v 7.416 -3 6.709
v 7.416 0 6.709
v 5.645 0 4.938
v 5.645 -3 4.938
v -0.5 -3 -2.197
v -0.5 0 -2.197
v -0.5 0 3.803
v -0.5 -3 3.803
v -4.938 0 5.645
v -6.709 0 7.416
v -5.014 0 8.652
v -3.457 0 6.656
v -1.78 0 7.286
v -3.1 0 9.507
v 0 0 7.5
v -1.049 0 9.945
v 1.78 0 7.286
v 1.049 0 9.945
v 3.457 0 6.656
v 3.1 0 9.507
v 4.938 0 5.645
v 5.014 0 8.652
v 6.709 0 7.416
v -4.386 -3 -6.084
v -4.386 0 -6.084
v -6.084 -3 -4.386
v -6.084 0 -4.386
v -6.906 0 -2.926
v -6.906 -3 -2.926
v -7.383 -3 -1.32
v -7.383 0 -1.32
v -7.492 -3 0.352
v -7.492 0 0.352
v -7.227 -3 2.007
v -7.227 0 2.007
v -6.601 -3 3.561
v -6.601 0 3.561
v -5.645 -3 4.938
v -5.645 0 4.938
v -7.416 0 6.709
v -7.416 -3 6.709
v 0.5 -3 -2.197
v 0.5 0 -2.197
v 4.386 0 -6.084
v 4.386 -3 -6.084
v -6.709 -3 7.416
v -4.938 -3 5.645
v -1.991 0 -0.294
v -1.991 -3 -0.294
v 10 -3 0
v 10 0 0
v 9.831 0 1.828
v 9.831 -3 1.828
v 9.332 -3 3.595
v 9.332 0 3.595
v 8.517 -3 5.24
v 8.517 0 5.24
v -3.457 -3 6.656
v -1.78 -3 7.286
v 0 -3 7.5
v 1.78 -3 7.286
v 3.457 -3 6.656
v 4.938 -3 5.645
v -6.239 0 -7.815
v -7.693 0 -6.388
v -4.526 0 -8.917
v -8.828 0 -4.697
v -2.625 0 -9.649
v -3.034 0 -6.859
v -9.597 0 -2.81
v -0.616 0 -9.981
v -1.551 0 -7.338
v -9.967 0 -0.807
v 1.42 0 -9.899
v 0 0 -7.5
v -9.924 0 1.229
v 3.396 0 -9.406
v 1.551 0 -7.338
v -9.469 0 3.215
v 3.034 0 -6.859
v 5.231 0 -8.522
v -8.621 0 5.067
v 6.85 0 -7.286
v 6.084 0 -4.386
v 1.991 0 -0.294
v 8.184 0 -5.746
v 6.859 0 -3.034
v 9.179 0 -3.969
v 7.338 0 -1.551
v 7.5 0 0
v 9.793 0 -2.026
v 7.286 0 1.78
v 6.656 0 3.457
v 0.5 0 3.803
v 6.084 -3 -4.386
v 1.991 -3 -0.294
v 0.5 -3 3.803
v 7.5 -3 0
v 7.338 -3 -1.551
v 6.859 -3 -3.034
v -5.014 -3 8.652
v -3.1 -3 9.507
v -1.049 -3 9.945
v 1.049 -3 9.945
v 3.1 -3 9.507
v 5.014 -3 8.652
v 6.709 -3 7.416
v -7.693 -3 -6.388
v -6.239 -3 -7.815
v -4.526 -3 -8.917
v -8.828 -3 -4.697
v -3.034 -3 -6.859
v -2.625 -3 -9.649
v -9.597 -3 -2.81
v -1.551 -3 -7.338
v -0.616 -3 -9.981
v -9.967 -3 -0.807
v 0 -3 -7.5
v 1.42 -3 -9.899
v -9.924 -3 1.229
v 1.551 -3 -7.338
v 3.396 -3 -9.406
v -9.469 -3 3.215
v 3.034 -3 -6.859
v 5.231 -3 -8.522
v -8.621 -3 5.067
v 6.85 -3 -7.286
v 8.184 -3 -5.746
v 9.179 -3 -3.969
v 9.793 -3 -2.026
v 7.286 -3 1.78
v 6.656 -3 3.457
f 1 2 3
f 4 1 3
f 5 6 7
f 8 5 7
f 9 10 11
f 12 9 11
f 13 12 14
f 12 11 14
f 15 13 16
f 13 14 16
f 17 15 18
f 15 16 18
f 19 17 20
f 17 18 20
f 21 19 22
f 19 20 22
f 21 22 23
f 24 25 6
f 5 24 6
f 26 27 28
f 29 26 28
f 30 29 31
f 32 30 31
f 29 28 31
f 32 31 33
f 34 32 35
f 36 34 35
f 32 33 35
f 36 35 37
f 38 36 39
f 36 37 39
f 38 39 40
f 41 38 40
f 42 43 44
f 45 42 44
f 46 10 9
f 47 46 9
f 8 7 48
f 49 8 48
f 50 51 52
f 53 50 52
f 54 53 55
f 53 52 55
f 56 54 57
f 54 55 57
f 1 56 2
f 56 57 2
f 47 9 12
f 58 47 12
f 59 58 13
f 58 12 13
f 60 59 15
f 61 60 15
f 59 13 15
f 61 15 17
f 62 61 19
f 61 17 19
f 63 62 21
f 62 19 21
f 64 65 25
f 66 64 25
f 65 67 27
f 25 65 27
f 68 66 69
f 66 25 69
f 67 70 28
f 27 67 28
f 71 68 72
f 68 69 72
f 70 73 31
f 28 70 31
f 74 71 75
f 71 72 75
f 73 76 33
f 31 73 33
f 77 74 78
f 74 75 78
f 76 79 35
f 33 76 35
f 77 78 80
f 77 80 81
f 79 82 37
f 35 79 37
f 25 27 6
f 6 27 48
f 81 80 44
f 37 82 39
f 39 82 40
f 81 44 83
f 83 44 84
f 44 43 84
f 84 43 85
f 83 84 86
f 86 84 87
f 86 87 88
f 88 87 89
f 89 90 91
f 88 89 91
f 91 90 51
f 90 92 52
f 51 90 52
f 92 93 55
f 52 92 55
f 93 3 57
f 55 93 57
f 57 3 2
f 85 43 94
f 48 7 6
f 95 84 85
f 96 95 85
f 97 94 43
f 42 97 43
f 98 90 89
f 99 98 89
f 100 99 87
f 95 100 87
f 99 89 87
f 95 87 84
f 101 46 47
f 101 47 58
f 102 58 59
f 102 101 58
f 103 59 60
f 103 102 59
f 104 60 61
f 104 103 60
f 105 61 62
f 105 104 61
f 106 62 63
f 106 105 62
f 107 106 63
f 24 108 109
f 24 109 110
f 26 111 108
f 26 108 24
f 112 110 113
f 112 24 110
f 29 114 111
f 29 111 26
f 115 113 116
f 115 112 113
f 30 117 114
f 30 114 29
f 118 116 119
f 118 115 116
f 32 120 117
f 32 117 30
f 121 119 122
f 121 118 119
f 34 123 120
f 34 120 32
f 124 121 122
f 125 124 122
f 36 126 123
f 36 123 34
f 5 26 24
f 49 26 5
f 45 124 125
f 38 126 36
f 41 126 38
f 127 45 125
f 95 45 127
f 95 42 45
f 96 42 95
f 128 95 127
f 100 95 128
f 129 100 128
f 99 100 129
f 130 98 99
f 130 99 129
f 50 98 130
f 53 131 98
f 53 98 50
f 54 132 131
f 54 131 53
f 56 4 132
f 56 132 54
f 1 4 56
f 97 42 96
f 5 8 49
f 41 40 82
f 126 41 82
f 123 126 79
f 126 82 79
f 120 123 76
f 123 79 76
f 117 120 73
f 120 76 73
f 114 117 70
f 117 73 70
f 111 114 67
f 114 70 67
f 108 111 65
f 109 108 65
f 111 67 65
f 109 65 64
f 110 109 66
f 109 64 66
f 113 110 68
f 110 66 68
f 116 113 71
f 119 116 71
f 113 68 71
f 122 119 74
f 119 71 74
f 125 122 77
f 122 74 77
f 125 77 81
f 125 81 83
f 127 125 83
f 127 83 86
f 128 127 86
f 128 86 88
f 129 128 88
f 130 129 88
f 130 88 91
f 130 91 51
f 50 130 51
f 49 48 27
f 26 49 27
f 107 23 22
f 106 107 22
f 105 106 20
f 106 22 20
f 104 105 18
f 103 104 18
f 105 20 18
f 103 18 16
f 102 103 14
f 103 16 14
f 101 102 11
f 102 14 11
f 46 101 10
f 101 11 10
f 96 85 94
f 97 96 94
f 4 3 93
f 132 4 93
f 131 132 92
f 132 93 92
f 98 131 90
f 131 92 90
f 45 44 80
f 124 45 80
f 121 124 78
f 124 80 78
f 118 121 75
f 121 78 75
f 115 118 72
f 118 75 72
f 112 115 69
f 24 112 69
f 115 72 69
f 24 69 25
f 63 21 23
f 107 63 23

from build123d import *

# Parameters (mm, degrees)
F1_DEPTH = 3
F2_DEPTH = 3
F4_DEPTH = 3


with BuildPart() as f1:
    # F0 (on Front) → F1 (new body)
    with BuildSketch(Plane.XZ):
        with BuildLine():
            ThreePointArc((-7.4157768365, 6.7086700553), (-3.5945953621, -9.331606731), (10, 0))
            ThreePointArc((10, 0), (9.331606731, 3.5945953621), (7.4157768365, 6.7086700553))
            Line((7.4157768365, 6.7086700553), (5.6450560127, 4.9379492315))
            ThreePointArc((5.6450560127, 4.9379492315), (7.0209657489, 2.6374305588), (7.5, 0))
            ThreePointArc((7.5, 0), (-2.6374305588, -7.0209657489), (-5.6450560127, 4.9379492315))
            Line((-5.6450560127, 4.9379492315), (-7.4157768365, 6.7086700553))
        make_face()
    extrude(amount=F1_DEPTH)

    # F3 (on Front) → F4 (join, through all)
    with BuildSketch(Plane.XZ):
        with BuildLine():
            Line((-1.9912281105, -0.2941718356), (-6.0835066474, -4.3864503726))
            ThreePointArc((-6.0835066474, -4.3864503726), (-5.7118298294, -4.8605555238), (-5.3033008589, -5.3033008589))
            Line((-5.3033008589, -5.3033008589), (-0.5, -0.5))
            Line((-0.5, -0.5), (-0.5, 1.1970562748))
            Line((-0.5, 1.1970562748), (-1.9912281105, -0.2941718356))
        make_face()
        with BuildLine():
            Line((-0.5, -0.5), (-5.3033008589, -5.3033008589))
            ThreePointArc((-5.3033008589, -5.3033008589), (-4.8605555238, -5.7118298294), (-4.3864503726, -6.0835066474))
            Line((-4.3864503726, -6.0835066474), (-0.5, -2.1970562748))
            Line((-0.5, -2.1970562748), (-0.5, -0.5))
        make_face()
        Polygon((-0.5, 3.8029437252), (-1.9912281105, -0.2941718356), (-0.5, 1.1970562748), align=None)
        with BuildLine():
            Line((0.5, -0.5), (5.3033008589, -5.3033008589))
            ThreePointArc((5.3033008589, -5.3033008589), (5.7118298294, -4.8605555238), (6.0835066474, -4.3864503726))
            Line((6.0835066474, -4.3864503726), (1.9912281105, -0.2941718356))
            Line((1.9912281105, -0.2941718356), (0.5, 1.1970562748))
            Line((0.5, 1.1970562748), (0.5, -0.5))
        make_face()
        with BuildLine():
            Line((0.5, -2.1970562748), (4.3864503726, -6.0835066474))
            ThreePointArc((4.3864503726, -6.0835066474), (4.8605555238, -5.7118298294), (5.3033008589, -5.3033008589))
            Line((5.3033008589, -5.3033008589), (0.5, -0.5))
            Line((0.5, -0.5), (0.5, -2.1970562748))
        make_face()
        Polygon((0.5, 3.8029437252), (0.5, 1.1970562748), (1.9912281105, -0.2941718356), align=None)
    extrude(amount=F4_DEPTH)


with BuildPart() as f2:
    # F0 (on Front) → F2 (new body, through all)
    with BuildSketch(Plane.XZ):
        with BuildLine():
            Line((4.9379492315, 5.6450560127), (6.7086700553, 7.4157768365))
            ThreePointArc((6.7086700553, 7.4157768365), (0, 10), (-6.7086700553, 7.4157768365))
            Line((-6.7086700553, 7.4157768365), (-4.9379492315, 5.6450560127))
            ThreePointArc((-4.9379492315, 5.6450560127), (0, 7.5), (4.9379492315, 5.6450560127))
        make_face()
    extrude(amount=F2_DEPTH)


solid = Compound([f1.part, f2.part])
